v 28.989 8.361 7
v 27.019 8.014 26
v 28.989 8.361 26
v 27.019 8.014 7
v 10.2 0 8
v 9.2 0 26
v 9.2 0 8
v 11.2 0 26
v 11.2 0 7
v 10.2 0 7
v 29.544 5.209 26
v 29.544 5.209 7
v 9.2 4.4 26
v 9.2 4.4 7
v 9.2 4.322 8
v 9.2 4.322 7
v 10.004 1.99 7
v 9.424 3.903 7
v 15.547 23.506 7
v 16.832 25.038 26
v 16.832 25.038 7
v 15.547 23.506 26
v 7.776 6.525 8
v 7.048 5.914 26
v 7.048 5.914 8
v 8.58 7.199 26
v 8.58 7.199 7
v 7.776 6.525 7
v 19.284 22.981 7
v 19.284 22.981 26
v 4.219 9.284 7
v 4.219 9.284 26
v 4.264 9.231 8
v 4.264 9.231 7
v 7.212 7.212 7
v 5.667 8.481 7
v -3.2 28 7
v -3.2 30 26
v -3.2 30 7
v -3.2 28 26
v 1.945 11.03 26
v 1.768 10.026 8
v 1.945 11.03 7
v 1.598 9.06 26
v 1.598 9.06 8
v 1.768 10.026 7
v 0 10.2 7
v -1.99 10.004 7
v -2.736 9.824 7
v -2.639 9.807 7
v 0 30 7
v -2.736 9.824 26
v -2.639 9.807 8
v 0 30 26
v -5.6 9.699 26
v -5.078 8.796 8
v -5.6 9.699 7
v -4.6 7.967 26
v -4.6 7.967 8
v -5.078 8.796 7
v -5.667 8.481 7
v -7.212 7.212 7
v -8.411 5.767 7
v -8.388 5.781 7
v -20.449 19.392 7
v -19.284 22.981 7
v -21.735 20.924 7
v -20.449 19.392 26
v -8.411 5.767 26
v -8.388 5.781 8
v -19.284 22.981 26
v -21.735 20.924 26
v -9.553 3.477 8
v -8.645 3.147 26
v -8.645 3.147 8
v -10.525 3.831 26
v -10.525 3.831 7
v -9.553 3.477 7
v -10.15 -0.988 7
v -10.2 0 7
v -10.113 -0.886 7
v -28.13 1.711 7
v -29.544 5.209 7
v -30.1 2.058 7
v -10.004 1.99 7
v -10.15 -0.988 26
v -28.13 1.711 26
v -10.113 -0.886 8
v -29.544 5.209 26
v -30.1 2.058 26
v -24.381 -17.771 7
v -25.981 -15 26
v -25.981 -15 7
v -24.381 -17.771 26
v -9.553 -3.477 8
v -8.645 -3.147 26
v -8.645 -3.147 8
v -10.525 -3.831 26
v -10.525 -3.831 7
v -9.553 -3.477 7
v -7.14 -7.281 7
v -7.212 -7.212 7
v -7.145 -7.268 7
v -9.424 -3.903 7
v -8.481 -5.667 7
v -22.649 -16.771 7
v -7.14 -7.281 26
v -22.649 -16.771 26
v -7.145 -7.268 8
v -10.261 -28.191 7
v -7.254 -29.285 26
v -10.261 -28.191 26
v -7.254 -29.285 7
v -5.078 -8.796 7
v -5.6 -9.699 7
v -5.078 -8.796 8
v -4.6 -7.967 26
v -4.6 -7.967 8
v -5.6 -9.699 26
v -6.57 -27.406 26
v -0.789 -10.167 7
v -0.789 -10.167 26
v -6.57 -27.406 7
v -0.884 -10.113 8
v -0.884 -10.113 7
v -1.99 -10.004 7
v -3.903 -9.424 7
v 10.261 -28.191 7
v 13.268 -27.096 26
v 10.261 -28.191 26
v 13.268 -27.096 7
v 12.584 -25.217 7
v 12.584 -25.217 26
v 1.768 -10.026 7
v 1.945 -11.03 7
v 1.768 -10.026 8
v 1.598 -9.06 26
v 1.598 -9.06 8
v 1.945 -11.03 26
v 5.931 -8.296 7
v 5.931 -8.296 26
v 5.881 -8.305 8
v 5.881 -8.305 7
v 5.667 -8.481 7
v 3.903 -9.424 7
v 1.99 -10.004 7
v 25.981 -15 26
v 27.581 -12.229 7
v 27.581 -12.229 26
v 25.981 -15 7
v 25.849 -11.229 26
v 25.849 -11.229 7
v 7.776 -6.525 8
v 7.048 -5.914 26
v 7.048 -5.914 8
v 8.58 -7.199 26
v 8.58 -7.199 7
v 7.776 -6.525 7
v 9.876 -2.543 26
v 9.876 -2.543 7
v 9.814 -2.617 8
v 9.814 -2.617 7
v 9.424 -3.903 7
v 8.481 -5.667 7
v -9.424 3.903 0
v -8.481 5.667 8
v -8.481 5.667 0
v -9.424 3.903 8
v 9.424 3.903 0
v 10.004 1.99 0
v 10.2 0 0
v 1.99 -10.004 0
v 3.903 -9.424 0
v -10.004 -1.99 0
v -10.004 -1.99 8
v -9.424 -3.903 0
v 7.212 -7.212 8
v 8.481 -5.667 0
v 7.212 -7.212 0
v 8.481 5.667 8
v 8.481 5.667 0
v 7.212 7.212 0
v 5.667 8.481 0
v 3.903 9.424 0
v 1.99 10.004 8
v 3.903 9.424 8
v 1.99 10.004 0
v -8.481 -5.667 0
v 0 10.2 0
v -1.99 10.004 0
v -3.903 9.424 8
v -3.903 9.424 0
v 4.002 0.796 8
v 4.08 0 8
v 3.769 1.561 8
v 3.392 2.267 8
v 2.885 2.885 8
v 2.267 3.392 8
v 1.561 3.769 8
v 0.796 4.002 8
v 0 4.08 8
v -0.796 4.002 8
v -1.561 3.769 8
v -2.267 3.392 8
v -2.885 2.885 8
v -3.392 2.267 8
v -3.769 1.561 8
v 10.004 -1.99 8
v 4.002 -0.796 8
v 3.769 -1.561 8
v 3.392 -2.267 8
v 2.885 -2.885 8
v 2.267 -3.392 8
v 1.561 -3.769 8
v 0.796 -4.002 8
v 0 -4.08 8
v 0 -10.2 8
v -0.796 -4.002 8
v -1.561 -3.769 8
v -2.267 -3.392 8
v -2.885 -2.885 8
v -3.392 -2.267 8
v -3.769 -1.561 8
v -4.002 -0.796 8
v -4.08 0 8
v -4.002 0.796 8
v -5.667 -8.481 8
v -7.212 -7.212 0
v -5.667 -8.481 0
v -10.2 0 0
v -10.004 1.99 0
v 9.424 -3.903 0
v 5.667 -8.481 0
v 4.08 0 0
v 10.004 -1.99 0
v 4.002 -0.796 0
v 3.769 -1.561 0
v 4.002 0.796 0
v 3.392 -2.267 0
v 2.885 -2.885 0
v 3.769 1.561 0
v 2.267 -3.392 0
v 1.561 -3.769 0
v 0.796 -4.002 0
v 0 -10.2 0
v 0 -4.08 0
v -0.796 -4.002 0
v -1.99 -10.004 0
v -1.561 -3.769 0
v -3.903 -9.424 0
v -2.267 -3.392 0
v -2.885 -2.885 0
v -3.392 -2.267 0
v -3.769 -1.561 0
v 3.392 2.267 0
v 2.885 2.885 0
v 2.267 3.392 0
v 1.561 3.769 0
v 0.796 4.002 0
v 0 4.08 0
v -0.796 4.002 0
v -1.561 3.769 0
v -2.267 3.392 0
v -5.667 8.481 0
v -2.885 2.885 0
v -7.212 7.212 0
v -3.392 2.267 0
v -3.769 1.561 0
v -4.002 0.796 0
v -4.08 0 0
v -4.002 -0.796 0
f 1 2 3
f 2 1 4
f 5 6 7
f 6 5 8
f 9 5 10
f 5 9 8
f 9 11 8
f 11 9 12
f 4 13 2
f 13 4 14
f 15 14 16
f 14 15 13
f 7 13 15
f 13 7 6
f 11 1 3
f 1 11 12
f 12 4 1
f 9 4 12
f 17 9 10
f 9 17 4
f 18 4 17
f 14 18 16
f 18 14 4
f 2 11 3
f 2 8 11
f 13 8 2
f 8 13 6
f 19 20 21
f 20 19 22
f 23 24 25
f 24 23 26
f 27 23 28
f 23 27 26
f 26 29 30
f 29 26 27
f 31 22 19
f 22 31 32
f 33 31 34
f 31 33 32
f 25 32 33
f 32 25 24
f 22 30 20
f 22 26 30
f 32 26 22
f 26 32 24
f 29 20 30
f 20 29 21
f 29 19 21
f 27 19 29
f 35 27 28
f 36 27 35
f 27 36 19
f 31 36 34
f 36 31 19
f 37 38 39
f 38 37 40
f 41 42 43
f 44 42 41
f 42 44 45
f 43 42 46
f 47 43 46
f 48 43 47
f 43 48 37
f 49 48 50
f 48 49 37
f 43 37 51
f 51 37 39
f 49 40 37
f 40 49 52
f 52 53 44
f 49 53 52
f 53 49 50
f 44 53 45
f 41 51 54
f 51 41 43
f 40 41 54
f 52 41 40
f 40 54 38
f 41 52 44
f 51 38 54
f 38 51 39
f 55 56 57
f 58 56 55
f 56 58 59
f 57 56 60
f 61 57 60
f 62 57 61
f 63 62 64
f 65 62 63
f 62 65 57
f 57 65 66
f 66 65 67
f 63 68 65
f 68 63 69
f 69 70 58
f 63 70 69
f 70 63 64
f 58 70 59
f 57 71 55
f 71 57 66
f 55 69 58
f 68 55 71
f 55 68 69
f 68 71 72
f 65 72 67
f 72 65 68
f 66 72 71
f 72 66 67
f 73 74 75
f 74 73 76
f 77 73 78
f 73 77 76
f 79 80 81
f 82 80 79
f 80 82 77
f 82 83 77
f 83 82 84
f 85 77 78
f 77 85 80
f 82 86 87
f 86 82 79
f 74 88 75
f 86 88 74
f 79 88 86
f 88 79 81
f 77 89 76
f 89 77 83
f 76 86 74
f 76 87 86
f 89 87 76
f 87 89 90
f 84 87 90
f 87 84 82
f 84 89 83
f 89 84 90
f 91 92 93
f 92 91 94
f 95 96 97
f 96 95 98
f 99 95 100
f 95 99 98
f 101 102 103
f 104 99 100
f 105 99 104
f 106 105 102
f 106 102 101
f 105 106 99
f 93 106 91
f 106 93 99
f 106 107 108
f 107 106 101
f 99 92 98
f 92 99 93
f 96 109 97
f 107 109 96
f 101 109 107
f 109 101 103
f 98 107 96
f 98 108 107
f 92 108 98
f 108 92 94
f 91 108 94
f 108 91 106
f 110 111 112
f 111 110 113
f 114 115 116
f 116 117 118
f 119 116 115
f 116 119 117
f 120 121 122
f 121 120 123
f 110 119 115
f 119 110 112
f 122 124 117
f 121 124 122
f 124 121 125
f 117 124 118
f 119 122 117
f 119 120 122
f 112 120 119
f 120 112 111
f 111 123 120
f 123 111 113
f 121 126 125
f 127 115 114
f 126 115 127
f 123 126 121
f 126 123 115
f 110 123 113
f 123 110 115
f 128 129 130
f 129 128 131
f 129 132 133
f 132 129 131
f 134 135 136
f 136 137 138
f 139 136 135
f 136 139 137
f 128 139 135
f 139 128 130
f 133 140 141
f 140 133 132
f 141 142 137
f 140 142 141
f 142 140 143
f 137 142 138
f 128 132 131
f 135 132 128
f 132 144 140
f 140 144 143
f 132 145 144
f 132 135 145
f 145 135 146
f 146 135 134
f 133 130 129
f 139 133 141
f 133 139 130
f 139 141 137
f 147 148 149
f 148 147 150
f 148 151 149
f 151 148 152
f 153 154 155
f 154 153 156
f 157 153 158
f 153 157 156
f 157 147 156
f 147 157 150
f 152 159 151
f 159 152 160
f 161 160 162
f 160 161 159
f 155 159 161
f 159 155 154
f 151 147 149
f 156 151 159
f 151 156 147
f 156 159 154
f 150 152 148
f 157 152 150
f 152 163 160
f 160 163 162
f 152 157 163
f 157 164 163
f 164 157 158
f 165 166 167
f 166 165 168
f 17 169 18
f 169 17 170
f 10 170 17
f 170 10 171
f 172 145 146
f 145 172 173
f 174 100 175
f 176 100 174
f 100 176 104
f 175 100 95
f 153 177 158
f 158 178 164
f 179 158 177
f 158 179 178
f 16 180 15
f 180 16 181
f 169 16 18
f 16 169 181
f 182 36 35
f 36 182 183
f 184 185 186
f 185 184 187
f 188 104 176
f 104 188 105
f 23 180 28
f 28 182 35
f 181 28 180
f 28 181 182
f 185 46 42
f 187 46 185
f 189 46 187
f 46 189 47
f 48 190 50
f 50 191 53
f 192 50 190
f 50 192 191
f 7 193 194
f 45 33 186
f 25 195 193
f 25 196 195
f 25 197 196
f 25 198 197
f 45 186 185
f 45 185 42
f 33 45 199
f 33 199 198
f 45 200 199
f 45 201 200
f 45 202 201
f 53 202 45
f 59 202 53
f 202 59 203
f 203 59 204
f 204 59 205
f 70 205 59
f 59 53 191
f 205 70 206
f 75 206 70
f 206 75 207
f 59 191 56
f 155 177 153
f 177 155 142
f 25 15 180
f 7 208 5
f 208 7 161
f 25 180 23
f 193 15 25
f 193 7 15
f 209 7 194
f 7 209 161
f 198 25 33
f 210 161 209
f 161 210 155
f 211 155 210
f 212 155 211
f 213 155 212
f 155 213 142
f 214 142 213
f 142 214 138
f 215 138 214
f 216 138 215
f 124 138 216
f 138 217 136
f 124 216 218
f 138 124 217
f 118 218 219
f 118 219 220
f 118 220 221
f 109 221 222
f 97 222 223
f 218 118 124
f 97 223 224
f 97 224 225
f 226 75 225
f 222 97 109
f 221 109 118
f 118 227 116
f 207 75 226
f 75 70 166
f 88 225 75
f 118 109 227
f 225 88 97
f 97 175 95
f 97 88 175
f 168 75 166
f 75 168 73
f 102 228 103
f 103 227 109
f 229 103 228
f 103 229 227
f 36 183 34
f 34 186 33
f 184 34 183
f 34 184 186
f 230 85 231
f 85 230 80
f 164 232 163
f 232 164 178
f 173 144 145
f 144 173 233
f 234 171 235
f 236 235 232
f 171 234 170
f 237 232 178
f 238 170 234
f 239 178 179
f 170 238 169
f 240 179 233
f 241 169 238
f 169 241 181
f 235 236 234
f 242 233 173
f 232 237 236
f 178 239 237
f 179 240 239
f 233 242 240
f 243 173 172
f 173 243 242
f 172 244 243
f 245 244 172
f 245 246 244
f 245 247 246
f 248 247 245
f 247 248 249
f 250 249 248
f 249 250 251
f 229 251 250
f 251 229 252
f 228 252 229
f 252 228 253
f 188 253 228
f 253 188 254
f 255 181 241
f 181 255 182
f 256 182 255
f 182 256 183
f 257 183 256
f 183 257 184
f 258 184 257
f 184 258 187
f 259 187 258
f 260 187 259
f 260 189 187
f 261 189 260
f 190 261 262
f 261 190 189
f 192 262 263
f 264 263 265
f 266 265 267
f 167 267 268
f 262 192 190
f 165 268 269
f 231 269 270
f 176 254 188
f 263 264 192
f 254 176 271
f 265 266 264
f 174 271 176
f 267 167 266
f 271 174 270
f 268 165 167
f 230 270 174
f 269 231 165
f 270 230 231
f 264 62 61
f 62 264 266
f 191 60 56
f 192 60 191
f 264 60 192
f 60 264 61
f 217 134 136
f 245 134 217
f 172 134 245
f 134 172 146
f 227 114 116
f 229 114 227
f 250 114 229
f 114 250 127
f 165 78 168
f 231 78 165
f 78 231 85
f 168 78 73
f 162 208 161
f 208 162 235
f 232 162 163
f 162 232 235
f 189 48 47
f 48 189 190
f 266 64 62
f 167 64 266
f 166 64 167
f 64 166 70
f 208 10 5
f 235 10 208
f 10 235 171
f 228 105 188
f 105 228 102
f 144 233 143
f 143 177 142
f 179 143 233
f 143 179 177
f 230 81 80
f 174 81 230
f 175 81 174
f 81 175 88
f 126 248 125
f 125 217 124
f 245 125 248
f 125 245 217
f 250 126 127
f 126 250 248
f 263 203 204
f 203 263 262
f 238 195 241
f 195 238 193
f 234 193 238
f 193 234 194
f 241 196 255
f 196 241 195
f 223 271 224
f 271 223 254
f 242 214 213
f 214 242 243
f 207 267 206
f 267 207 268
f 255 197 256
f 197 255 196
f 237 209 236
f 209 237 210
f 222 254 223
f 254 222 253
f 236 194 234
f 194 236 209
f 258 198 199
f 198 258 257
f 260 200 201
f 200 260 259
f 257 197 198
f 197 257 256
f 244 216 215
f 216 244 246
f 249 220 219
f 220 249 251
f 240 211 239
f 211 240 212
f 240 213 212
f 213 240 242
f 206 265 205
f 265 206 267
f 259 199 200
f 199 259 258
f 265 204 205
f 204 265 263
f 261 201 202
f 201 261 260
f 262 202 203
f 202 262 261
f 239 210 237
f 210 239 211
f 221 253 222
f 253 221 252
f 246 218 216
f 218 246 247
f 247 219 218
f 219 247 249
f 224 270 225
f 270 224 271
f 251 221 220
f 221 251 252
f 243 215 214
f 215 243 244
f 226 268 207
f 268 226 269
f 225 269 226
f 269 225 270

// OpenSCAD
$fn = 32;

// ----------------------------------------------------------------------
// Impeller: 60 mm, 9 blades, 26 mm tall
// ----------------------------------------------------------------------

// --- parameters (mm) ---
boss_d = 20.4;            // hub diameter
boss_h = 8;               // hub height
rotor_d = 60;             // outer diameter over the blades
vane_count = 9;           // number of blades
blade_t = 2;              // blade thickness
blade_h = 18;             // blade height
blade_in_r = 9.2;         // blade root radius
blade_out_r = 28;         // blade tip radius
sweep = 10;               // blade sweep, degrees
bore_d = 8.16;            // shaft bore

module hub() {
  cylinder(h = boss_h, d = boss_d);
}

module blade() {
  /* blade swept between two boxes: hull of the root and the tip section */
  hull() {
    translate([blade_in_r, 0, boss_h - 1])
      cube([blade_t, blade_t * 2.2, blade_h + 1], center = false);
    rotate([0, 0, sweep])
      translate([blade_out_r, 0, boss_h - 1])
        cube([blade_t, blade_t * 1.6, blade_h + 1], center = false);
  }
}

module blades() {
  for (i = [0 : vane_count - 1])
    rotate([0, 0, i * 360 / vane_count]) blade();
}

difference() {
  union() {
    hub();
    blades();
  }
  translate([0, 0, -1]) cylinder(h = boss_h + blade_h + 0 + 3, d = bore_d);
}
